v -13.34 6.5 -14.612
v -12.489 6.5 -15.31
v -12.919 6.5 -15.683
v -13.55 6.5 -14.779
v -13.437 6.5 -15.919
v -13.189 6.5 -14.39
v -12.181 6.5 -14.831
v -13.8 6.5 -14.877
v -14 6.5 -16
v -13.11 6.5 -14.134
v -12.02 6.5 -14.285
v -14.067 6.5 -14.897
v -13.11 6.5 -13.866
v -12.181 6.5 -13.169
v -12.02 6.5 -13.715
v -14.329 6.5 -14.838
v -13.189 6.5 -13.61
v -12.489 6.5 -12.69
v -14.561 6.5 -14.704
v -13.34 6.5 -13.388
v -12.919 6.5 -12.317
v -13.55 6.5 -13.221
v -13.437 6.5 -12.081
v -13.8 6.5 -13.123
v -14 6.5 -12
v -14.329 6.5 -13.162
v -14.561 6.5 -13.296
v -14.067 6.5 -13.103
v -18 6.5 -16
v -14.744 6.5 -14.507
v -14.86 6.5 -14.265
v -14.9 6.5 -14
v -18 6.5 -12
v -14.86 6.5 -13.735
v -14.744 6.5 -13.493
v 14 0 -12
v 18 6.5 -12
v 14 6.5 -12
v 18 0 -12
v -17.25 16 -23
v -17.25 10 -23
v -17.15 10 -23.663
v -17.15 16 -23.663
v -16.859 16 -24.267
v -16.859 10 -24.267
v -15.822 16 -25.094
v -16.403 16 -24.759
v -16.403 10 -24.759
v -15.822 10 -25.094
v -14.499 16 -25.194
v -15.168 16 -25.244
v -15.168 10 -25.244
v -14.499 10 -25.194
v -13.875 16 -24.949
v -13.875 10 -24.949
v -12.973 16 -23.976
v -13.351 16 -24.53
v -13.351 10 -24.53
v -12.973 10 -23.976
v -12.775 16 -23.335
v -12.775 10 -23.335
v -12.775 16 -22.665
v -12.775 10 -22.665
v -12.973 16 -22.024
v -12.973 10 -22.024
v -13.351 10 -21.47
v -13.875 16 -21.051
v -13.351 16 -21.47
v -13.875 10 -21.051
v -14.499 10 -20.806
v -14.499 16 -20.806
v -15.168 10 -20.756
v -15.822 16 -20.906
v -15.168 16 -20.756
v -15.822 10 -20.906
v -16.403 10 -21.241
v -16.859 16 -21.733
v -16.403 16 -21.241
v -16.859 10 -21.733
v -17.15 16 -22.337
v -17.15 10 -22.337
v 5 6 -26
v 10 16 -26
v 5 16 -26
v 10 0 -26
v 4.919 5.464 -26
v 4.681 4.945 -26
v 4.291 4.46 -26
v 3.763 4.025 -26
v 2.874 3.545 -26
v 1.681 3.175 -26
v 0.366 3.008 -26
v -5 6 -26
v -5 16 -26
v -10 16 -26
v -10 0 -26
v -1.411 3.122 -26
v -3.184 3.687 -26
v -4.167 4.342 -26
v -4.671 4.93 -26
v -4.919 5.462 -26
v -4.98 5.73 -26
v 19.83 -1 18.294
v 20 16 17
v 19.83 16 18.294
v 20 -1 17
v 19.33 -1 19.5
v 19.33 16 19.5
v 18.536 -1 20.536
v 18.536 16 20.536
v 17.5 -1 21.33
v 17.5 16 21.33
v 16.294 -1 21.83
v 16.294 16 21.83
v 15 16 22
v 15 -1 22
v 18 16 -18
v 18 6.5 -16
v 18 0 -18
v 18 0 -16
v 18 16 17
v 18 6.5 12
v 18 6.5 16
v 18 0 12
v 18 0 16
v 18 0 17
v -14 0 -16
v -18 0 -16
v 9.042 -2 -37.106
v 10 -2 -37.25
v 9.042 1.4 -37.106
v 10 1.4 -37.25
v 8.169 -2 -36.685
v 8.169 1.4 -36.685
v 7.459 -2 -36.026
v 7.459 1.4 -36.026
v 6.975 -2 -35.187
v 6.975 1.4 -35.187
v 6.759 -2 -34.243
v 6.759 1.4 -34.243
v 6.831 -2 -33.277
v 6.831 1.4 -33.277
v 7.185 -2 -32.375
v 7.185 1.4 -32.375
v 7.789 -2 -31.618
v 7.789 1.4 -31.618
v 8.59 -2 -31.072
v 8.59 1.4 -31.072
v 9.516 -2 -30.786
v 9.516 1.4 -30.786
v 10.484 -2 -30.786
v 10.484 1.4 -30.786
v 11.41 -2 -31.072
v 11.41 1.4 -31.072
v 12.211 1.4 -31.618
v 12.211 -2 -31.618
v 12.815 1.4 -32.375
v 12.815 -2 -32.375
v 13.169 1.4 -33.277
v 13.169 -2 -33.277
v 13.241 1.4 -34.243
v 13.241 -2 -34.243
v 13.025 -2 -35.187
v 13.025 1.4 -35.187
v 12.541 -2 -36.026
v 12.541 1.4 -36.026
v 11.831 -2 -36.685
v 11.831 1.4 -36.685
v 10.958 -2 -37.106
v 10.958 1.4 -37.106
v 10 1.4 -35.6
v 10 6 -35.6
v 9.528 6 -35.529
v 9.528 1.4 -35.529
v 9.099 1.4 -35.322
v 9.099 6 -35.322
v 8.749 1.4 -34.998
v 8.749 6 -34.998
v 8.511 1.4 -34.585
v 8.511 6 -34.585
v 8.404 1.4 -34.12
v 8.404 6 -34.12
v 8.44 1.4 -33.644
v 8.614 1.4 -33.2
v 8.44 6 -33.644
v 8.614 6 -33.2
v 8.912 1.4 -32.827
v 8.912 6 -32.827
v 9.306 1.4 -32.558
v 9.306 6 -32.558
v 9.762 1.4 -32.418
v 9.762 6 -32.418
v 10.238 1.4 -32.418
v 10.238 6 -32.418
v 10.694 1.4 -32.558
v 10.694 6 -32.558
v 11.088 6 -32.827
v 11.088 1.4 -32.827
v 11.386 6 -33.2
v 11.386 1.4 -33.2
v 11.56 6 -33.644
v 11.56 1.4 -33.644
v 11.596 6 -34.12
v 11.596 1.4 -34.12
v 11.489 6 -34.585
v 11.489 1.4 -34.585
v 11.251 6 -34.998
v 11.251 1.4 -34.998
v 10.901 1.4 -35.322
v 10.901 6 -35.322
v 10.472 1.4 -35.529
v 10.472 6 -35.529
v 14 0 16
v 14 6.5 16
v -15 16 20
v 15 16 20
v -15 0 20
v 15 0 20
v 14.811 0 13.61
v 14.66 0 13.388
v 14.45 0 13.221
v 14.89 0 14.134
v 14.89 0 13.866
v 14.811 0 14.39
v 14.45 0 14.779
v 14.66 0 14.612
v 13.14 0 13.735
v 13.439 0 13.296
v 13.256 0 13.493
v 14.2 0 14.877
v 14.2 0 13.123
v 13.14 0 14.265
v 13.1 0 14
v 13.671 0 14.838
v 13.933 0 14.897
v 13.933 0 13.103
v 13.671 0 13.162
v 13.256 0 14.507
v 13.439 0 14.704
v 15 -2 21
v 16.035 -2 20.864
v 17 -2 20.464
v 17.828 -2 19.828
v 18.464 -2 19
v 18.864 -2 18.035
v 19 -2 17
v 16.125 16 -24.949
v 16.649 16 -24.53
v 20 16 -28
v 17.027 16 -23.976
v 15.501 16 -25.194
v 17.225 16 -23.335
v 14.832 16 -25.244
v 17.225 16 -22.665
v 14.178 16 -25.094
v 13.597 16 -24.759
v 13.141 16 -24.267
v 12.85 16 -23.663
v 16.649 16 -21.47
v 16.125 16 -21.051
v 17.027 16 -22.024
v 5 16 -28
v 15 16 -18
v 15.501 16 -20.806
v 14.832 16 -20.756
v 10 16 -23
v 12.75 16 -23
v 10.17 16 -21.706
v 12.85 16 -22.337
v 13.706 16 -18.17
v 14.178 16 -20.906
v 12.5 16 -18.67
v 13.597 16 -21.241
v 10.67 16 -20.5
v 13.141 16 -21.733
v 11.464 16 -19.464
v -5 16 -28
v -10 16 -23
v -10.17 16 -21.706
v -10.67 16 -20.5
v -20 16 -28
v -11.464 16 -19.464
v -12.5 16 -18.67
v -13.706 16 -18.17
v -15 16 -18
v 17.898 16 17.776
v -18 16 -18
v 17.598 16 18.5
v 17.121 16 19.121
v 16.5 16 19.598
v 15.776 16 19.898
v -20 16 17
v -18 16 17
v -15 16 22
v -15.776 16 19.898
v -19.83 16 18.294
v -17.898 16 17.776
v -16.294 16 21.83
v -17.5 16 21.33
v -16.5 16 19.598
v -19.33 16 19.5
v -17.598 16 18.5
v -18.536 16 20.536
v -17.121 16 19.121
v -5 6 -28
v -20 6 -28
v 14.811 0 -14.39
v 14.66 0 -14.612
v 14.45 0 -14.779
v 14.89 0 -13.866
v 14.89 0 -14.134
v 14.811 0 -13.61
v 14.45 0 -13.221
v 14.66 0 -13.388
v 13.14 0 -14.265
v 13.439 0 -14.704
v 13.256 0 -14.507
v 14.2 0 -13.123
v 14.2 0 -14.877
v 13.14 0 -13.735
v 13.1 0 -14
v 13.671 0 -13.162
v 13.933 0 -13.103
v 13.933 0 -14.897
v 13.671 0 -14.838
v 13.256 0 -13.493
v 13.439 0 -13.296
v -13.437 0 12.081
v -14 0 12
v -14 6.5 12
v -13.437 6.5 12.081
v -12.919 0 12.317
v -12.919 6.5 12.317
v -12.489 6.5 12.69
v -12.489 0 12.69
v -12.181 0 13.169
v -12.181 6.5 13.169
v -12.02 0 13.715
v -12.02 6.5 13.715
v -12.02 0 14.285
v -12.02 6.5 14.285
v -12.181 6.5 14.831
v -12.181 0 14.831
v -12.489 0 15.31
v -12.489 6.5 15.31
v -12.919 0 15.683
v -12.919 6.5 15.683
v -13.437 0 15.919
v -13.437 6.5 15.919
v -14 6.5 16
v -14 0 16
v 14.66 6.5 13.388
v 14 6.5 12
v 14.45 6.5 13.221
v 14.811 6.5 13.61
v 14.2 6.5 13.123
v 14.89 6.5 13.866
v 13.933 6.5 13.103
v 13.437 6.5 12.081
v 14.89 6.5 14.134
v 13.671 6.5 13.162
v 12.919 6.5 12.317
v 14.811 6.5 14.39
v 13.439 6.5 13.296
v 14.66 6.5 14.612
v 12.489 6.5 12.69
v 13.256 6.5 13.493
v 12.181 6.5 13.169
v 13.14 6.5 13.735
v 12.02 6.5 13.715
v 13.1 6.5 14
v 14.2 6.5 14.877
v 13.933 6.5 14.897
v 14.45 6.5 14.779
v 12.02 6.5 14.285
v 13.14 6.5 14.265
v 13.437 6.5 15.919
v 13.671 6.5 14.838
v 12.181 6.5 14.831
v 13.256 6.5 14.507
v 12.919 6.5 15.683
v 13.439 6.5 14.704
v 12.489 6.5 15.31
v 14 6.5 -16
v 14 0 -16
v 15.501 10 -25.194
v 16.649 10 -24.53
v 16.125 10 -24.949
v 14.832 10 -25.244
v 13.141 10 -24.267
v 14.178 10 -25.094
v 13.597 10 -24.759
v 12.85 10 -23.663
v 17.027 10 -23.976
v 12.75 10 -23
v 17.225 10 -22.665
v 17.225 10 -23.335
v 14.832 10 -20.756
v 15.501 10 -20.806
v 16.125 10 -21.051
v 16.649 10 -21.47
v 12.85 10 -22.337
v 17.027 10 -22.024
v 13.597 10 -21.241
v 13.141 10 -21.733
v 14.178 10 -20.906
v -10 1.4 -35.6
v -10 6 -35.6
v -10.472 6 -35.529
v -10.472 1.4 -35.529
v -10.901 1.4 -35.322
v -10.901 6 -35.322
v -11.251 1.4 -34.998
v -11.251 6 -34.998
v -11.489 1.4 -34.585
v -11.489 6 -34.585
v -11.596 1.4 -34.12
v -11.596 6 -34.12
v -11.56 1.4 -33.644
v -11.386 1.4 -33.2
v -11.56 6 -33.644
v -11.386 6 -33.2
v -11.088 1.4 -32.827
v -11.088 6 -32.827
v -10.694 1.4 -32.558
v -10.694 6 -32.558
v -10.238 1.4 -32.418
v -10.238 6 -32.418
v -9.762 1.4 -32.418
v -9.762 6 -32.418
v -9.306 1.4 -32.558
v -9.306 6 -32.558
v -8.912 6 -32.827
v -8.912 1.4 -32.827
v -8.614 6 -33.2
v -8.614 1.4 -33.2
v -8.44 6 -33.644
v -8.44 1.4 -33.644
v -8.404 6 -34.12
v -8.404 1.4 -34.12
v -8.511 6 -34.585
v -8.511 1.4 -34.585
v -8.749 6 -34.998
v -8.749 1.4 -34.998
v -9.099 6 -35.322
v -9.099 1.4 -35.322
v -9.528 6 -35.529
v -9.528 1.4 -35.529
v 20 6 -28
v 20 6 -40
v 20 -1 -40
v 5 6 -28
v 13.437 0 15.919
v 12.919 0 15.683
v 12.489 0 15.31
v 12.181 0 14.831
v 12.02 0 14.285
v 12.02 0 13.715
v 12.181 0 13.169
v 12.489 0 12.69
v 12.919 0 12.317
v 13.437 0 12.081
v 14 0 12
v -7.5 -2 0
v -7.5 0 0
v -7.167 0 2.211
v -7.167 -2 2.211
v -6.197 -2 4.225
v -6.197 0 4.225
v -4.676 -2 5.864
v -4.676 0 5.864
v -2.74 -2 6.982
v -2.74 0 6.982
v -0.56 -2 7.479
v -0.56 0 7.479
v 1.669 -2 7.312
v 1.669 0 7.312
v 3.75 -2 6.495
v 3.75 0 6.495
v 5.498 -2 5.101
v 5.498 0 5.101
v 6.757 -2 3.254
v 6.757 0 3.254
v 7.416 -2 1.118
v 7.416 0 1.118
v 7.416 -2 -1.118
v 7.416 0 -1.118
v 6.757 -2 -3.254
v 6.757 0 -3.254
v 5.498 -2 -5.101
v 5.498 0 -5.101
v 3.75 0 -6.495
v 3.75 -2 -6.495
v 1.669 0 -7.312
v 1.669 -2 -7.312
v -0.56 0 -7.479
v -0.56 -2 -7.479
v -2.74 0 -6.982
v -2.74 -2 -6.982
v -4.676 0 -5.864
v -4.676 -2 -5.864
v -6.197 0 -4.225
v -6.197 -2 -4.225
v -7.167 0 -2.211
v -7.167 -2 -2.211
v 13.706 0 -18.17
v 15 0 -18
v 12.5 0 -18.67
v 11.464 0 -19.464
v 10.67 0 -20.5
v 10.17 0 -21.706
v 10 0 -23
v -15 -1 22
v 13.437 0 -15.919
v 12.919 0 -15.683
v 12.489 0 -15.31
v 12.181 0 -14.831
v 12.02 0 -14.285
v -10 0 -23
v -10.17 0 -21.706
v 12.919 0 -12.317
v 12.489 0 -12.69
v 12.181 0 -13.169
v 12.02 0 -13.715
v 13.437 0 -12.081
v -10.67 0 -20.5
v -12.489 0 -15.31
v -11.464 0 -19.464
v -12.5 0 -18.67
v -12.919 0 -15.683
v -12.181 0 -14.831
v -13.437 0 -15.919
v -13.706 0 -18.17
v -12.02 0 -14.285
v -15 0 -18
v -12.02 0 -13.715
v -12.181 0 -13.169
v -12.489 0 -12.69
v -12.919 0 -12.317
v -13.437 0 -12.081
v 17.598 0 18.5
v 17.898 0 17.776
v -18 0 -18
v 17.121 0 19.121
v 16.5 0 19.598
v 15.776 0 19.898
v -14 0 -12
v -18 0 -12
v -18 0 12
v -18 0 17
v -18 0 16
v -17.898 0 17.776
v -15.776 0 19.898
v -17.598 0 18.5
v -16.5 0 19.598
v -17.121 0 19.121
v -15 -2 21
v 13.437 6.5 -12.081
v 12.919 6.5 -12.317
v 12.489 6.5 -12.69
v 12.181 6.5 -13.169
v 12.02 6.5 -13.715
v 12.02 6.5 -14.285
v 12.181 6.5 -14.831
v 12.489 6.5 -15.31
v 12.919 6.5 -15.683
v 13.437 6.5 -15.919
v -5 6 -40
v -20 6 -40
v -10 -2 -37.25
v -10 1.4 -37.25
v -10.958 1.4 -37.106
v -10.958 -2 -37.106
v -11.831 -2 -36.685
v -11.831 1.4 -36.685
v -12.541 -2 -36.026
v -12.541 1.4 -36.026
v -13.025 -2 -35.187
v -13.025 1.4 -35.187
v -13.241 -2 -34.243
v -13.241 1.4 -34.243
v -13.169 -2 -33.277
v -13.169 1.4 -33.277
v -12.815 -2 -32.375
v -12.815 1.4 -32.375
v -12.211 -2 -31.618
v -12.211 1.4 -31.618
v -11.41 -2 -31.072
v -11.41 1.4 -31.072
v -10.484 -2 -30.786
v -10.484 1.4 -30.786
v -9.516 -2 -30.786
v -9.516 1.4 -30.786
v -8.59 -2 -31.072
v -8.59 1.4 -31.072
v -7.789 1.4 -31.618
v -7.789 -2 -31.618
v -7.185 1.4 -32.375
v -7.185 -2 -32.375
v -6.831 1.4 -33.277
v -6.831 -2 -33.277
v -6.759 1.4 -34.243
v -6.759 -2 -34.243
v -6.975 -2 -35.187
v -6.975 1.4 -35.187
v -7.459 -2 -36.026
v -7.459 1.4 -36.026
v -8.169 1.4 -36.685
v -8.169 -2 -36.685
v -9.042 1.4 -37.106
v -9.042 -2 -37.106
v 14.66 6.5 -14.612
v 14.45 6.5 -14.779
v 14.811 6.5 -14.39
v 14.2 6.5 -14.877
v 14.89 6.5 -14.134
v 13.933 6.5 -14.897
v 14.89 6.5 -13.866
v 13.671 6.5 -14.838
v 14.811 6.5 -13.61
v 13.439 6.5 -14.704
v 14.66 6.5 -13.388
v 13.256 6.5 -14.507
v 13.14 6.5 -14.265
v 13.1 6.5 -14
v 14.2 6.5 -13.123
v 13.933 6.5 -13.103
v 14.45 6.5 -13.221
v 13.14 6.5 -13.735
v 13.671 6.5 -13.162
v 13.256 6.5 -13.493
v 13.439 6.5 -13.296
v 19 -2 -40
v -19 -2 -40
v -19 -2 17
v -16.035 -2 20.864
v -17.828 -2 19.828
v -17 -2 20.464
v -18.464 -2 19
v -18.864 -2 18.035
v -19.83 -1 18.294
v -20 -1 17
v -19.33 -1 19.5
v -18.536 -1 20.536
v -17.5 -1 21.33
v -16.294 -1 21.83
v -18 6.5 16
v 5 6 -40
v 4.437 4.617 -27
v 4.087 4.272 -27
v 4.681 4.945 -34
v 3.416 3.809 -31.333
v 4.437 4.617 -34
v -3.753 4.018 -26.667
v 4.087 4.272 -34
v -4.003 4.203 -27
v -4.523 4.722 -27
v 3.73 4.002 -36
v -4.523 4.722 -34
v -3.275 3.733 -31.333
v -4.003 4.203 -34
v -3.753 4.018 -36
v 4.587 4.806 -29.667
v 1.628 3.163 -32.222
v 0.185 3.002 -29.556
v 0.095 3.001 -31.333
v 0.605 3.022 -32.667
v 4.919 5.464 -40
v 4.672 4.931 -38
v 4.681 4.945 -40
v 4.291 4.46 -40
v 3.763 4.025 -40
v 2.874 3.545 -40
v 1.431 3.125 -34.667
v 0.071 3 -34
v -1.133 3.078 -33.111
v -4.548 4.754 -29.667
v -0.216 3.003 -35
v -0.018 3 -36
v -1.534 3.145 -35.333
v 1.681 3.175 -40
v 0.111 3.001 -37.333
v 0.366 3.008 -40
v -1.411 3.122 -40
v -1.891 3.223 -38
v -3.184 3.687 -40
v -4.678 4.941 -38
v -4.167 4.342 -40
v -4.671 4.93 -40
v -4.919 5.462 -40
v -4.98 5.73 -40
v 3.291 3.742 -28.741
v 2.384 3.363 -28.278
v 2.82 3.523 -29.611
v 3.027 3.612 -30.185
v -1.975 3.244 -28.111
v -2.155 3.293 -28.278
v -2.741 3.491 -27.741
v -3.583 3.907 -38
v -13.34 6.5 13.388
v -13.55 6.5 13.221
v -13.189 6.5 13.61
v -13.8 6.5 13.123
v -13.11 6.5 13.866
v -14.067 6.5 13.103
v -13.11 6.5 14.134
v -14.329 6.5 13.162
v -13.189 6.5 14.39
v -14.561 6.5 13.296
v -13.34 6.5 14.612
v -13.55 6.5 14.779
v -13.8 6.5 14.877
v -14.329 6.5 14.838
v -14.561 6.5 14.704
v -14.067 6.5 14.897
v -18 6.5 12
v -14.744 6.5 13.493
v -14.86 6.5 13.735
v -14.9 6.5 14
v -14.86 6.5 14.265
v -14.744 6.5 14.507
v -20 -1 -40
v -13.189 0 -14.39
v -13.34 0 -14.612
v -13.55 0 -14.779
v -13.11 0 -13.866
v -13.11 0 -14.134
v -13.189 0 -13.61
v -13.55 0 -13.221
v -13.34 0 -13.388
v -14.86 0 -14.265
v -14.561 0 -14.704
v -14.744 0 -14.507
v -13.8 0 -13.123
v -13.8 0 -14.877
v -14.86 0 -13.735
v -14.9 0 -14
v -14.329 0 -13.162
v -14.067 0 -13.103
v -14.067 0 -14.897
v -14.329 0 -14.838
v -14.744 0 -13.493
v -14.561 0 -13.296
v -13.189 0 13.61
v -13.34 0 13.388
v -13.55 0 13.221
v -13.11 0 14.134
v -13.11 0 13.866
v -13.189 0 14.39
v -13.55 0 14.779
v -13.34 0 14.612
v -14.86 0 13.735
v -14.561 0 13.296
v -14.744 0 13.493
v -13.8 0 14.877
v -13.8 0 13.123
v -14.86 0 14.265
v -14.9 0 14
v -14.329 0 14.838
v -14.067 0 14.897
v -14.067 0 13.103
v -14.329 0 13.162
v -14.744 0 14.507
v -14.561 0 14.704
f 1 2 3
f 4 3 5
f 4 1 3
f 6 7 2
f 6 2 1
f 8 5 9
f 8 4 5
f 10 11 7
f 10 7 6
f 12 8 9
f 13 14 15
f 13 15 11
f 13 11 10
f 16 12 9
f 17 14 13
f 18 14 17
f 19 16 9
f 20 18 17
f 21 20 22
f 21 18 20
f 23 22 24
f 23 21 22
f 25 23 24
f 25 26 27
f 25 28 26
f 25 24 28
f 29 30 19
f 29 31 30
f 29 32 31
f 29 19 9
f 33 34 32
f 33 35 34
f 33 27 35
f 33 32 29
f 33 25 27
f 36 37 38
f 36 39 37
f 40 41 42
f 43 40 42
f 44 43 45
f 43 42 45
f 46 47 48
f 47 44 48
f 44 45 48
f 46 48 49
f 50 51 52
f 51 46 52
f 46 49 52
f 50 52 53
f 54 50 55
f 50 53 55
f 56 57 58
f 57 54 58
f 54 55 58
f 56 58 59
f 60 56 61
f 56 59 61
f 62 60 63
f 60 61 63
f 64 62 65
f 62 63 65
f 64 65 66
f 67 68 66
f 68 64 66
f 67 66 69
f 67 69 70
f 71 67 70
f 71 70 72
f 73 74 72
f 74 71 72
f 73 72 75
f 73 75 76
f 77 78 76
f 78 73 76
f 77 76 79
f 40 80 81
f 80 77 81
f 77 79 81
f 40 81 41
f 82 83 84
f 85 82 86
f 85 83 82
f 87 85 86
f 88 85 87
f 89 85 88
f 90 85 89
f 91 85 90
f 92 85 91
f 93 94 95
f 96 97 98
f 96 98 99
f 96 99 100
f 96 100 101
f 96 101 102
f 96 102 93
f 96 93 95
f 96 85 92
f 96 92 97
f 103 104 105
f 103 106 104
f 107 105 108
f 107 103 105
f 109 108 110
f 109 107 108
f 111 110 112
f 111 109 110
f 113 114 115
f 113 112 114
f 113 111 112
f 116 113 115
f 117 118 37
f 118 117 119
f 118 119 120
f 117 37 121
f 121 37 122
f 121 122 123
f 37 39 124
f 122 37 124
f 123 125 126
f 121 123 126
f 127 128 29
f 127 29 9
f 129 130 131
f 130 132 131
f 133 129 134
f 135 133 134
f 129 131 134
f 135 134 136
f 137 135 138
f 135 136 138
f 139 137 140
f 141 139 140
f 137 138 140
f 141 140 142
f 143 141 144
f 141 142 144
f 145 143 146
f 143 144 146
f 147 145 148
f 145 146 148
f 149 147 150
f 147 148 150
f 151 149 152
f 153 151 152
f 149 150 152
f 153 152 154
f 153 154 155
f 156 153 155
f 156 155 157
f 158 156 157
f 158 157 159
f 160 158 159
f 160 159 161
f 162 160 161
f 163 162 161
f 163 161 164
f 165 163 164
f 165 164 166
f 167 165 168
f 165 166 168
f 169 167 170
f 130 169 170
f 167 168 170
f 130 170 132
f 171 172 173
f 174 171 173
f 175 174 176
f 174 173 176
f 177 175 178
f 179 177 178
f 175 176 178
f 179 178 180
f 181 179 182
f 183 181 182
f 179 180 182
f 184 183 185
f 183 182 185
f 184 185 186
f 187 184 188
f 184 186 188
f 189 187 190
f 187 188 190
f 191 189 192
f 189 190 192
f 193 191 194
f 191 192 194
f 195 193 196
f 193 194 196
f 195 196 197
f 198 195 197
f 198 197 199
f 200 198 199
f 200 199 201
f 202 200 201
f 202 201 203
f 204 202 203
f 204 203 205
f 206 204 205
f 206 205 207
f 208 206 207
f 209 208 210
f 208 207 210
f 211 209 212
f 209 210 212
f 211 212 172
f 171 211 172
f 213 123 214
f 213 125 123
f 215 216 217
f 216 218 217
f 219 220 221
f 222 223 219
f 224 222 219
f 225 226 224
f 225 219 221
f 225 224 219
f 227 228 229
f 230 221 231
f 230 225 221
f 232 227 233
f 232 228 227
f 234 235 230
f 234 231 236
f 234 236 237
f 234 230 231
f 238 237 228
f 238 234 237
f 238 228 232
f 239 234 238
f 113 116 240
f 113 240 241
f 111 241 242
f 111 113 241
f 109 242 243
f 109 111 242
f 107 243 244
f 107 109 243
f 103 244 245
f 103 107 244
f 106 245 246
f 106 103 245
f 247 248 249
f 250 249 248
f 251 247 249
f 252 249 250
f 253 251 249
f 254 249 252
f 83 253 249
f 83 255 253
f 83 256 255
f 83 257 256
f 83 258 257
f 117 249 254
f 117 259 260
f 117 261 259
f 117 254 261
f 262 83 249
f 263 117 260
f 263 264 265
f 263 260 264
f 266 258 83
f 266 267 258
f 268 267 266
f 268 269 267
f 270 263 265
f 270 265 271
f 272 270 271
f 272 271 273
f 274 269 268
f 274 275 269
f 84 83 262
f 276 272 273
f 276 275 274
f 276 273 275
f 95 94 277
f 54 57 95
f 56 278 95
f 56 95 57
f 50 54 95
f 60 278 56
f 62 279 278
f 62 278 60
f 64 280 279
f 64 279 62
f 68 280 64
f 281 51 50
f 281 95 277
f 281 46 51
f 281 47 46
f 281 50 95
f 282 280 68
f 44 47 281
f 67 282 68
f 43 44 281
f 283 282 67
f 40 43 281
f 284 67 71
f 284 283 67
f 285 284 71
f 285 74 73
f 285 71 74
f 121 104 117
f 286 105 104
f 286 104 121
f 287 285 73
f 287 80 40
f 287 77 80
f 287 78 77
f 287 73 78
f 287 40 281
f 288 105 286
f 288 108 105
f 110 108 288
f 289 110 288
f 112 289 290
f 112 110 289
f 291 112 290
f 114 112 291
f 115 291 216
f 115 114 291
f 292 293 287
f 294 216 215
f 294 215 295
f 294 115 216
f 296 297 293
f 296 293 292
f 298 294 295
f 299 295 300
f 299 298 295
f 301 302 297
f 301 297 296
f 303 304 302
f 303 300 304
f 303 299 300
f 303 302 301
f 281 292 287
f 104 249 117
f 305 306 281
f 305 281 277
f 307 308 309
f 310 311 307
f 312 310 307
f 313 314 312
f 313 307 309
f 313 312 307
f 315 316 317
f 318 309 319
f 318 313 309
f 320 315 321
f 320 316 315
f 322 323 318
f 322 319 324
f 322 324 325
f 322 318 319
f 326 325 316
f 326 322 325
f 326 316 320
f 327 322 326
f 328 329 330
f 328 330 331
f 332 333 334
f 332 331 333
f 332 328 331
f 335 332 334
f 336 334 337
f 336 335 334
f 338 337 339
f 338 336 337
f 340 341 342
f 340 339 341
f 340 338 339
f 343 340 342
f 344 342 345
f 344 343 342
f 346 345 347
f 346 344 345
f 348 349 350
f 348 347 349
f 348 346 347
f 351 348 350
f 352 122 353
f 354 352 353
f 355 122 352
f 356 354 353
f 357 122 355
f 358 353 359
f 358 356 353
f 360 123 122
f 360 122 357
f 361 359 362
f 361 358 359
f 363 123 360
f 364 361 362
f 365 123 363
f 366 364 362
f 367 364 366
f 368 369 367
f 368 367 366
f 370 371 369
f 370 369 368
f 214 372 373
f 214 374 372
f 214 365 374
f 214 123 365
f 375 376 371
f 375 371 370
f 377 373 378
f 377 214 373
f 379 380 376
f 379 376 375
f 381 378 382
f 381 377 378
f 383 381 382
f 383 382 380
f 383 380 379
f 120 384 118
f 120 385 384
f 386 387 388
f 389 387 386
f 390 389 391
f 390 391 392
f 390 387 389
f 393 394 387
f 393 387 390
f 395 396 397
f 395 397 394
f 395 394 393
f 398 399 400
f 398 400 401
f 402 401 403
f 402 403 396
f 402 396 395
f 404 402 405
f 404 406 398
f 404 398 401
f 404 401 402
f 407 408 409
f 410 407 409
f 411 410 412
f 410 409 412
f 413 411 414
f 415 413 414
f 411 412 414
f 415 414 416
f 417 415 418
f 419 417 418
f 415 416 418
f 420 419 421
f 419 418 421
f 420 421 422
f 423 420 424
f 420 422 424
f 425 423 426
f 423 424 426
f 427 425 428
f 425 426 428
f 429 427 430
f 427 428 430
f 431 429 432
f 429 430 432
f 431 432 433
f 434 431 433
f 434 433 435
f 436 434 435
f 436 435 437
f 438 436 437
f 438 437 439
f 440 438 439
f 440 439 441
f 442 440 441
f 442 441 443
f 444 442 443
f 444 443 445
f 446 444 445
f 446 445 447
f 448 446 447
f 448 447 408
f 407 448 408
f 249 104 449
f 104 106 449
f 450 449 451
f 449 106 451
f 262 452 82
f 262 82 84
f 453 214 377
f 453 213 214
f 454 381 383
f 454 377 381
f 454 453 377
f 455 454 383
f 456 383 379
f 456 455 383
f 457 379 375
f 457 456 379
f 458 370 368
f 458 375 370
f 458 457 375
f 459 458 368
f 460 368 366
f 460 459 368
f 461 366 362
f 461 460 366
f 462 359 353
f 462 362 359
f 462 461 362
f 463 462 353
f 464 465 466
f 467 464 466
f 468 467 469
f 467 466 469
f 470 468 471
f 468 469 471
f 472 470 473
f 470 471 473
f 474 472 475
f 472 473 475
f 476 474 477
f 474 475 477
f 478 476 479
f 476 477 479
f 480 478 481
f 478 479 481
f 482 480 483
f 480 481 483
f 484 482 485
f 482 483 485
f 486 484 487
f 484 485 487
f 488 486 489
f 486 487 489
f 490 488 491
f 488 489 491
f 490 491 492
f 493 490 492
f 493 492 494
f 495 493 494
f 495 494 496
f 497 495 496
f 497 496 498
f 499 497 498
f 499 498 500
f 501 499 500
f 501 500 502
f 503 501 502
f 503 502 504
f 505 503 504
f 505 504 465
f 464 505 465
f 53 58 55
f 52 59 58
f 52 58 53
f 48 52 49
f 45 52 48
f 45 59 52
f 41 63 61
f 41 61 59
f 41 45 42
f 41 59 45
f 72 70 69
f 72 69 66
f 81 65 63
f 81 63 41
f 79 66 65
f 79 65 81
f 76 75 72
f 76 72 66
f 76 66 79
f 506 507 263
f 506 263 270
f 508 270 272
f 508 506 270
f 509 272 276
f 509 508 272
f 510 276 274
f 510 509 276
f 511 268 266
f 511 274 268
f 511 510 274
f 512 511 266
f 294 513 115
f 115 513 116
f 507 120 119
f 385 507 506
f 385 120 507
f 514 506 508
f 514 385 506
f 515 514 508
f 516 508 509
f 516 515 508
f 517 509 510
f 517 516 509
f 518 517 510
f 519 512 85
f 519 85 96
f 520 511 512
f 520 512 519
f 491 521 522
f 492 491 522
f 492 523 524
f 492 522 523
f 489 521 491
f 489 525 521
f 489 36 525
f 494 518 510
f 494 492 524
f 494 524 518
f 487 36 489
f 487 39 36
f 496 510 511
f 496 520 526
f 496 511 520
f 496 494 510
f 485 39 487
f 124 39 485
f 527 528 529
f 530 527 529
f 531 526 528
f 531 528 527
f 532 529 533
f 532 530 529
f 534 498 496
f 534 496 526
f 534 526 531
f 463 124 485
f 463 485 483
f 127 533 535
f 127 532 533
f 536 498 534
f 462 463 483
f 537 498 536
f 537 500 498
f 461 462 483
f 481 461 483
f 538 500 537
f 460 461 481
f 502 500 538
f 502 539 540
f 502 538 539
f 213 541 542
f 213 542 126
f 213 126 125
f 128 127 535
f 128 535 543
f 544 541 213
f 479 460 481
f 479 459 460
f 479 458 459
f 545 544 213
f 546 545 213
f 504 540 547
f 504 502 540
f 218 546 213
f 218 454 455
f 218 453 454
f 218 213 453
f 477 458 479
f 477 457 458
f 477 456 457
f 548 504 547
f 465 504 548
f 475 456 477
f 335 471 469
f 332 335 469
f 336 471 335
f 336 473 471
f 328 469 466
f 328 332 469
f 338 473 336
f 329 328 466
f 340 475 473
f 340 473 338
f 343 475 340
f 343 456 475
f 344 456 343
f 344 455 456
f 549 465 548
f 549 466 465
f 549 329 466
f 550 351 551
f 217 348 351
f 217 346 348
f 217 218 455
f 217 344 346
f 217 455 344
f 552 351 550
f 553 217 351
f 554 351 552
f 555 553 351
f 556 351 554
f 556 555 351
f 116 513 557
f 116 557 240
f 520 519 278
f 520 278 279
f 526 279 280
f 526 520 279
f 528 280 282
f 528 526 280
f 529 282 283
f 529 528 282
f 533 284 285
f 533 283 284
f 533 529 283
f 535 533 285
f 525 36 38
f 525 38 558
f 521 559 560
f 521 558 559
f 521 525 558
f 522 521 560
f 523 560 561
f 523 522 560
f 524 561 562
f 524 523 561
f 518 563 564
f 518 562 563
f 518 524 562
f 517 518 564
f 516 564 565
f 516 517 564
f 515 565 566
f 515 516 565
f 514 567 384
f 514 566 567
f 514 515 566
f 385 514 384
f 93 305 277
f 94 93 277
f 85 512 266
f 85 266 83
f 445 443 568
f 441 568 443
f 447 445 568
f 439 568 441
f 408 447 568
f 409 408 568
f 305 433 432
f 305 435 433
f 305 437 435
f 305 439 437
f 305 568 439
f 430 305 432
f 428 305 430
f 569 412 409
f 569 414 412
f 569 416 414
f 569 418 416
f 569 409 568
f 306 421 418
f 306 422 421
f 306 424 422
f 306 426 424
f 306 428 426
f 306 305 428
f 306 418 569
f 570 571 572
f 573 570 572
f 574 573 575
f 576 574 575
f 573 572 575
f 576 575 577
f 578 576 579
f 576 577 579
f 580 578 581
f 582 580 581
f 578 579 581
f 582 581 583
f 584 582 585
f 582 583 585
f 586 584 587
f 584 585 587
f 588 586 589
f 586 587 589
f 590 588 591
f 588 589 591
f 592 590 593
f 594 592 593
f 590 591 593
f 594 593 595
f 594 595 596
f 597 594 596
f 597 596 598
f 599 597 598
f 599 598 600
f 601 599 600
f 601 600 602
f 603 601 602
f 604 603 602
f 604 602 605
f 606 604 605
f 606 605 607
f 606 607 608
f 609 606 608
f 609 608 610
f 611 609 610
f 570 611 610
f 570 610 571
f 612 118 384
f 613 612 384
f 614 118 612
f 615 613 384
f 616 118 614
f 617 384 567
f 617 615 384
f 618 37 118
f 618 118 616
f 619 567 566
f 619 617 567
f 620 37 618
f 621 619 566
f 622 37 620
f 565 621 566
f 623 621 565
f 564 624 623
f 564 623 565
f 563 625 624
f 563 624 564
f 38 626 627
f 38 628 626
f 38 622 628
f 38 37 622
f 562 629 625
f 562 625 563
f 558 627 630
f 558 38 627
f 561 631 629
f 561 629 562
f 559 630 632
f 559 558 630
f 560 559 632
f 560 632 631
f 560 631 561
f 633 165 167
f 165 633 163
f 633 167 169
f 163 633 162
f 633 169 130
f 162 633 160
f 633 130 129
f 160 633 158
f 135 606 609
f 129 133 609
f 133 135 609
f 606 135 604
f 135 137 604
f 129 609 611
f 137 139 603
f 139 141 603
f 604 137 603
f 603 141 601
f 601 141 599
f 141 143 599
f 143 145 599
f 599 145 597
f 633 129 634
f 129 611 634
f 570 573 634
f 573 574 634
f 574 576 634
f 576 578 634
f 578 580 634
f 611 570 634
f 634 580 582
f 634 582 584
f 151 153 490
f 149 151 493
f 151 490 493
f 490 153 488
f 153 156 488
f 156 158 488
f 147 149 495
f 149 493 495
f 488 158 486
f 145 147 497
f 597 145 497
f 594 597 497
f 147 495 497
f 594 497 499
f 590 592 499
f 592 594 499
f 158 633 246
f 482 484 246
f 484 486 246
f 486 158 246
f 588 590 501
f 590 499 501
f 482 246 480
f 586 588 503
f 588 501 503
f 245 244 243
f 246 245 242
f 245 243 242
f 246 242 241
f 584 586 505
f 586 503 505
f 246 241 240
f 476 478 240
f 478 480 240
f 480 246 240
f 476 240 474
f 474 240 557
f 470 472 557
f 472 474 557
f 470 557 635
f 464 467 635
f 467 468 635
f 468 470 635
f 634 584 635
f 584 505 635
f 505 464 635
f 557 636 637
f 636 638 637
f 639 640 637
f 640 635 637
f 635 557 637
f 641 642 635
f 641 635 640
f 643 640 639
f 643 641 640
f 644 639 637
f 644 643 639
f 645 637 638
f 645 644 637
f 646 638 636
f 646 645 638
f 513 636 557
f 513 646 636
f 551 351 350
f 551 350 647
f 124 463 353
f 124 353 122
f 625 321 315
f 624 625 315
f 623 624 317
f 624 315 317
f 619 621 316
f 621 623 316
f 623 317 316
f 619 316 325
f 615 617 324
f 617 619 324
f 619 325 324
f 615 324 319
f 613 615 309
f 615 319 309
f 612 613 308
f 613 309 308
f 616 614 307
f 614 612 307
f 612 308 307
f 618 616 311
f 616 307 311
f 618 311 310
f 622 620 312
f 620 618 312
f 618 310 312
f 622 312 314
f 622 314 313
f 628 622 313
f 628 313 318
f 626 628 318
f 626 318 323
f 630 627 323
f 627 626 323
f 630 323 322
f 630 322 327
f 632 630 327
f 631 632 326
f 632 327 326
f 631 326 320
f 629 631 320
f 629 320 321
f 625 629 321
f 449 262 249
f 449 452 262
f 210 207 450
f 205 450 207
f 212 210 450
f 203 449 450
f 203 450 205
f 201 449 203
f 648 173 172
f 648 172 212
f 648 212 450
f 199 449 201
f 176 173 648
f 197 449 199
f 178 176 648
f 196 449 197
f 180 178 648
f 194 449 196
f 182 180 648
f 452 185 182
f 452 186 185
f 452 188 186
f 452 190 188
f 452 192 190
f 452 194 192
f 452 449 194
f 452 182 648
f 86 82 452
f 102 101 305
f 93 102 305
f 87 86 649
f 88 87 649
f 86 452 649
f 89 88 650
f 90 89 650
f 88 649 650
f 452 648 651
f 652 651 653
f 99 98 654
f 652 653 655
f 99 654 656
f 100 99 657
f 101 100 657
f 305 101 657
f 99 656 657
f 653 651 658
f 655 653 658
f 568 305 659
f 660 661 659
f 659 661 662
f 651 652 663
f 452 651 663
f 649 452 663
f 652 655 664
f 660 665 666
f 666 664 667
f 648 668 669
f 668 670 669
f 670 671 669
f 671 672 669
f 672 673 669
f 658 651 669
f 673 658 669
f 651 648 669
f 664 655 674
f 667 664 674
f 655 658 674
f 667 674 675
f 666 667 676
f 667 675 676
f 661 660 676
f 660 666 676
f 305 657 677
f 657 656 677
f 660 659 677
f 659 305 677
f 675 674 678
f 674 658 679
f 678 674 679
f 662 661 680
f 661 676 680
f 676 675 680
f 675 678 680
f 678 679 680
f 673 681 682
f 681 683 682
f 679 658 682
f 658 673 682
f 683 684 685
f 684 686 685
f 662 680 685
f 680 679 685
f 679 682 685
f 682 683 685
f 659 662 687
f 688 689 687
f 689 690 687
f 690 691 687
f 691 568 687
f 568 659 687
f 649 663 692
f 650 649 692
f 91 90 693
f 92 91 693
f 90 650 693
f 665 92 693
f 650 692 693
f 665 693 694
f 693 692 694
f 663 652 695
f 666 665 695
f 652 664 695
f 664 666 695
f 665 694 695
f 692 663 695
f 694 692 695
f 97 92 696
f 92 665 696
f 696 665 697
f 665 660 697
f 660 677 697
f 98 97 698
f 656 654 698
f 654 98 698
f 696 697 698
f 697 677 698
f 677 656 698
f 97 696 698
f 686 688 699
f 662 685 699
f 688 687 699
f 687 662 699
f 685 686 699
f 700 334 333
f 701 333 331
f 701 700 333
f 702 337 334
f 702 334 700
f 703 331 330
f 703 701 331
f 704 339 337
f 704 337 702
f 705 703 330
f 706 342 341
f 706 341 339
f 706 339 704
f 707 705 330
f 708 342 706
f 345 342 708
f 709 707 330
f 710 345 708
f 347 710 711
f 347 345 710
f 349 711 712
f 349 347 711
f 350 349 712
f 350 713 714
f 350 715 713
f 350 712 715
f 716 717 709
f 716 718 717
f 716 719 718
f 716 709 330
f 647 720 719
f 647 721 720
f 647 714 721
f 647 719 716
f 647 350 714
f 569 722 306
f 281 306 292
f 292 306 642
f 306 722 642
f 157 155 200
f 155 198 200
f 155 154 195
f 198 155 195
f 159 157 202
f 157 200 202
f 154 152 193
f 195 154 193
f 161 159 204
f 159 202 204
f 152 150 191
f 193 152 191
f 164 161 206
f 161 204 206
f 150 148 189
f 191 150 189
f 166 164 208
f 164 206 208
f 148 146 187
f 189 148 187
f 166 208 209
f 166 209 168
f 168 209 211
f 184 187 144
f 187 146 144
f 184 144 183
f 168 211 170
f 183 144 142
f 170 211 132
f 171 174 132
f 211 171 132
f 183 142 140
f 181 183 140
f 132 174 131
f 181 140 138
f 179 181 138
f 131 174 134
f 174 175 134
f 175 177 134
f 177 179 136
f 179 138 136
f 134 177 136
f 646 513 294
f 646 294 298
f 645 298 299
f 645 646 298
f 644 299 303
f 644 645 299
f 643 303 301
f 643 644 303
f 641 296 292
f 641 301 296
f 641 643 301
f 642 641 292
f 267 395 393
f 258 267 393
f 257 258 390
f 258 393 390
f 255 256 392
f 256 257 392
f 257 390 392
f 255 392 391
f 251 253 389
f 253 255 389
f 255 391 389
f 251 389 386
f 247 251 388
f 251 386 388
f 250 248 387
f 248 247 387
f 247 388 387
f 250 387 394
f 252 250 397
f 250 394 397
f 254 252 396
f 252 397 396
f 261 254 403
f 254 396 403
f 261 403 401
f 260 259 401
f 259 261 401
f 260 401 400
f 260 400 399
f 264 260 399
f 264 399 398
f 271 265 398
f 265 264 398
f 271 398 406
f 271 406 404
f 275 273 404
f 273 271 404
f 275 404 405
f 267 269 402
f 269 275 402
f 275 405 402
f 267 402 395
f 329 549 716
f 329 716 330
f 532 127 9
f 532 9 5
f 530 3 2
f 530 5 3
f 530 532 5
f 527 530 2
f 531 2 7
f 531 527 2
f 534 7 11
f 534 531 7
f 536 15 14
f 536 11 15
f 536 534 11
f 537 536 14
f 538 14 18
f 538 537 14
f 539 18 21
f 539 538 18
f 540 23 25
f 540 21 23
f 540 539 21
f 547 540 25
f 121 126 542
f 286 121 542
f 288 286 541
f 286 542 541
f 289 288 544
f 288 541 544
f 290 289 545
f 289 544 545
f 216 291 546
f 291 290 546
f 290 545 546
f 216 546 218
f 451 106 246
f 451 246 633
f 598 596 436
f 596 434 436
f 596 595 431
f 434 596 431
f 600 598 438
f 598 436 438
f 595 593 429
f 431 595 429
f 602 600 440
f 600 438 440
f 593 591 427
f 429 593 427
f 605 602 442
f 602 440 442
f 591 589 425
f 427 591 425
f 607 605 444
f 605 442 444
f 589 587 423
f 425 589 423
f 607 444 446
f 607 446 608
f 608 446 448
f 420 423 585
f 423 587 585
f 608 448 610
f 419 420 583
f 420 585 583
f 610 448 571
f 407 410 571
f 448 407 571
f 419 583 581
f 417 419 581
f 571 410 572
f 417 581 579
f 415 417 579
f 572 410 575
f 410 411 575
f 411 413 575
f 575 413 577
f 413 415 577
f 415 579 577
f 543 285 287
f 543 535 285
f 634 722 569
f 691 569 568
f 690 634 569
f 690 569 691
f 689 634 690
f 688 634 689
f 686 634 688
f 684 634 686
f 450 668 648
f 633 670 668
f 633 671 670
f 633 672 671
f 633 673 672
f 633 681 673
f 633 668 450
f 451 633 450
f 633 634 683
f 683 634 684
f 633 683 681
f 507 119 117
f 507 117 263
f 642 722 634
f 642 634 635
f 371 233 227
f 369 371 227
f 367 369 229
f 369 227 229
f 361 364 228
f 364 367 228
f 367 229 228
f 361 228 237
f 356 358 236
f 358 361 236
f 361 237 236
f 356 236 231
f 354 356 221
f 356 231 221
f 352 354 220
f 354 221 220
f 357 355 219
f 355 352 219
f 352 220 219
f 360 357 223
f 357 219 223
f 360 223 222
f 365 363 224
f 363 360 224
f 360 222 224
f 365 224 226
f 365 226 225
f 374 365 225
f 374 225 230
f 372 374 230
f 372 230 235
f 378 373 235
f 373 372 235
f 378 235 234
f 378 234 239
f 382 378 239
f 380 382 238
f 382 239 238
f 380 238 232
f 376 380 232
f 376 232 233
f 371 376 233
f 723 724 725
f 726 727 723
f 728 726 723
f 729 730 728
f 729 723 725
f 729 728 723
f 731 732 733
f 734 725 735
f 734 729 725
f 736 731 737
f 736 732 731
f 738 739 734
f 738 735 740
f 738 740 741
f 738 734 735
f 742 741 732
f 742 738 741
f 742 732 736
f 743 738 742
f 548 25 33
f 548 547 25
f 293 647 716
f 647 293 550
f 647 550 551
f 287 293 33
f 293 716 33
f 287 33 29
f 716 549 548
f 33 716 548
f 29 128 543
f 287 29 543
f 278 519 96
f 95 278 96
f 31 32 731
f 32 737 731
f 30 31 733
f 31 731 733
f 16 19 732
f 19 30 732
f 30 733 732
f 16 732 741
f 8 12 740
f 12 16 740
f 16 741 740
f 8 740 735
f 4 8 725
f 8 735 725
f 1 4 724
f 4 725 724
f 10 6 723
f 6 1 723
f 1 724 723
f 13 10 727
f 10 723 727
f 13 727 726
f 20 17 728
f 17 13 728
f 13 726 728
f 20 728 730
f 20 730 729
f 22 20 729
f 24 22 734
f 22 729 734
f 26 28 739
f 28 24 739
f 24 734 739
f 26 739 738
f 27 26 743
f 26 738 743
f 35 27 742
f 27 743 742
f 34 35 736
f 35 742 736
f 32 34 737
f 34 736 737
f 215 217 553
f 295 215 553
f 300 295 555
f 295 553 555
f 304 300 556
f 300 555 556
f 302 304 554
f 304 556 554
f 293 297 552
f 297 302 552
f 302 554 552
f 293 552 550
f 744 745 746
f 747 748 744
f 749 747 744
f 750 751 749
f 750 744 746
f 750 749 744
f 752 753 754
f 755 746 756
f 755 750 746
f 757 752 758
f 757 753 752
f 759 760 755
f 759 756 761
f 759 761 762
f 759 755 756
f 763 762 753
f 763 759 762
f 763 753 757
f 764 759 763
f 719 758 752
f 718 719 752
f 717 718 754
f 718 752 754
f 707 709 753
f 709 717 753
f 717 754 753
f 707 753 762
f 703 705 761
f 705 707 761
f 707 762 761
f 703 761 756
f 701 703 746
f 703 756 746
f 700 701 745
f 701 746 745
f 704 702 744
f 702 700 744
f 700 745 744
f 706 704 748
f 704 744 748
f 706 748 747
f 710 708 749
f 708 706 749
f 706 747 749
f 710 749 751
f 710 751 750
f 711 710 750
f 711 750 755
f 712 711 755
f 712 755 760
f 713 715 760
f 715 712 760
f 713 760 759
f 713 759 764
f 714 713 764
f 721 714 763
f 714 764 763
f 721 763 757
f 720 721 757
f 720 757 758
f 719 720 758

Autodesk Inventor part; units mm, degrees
ref_plane "YZ Plane" through (0, 0, 0) normal (1, 0, 0) x (0, 1, 0)
ref_plane "XZ Plane" through (0, 0, 0) normal (0, 1, 0) x (-1, 0, 0)
ref_plane "XY Plane" through (0, 0, 0) normal (0, 0, 1) x (1, 0, 0)
sketch "Skizze1" plane through (0, 0, 0) normal (0, 1, 0) x (-1, 0, 0)
  arc A0 (20, 17) -> (15, 22) centre (15, 17) ccw
  arc A1 (-15, 22) -> (-20, 17) centre (-15, 17) ccw
  line L0 (14, -12) -> (18, -12)
  arc A2 (14, -12) -> (14, -16) centre (14, -14) ccw
  line L1 (18, -16) -> (14, -16)
  line L2 (-14, -16) -> (-18, -16)
  arc A3 (-14, -16) -> (-14, -12) centre (-14, -14) ccw
  line L3 (-18, -12) -> (-14, -12)
  line L4 (-14, 12) -> (-18, 12)
  arc A4 (-14, 12) -> (-14, 16) centre (-14, 14) ccw
  line L5 (-18, 16) -> (-14, 16)
  line L6 (14, 16) -> (18, 16)
  arc A5 (14, 16) -> (14, 12) centre (14, 14) ccw
  line L7 (18, 12) -> (14, 12)
  line L8 (14, 14) -> (-14, 14) construction
  line L9 (-14, 14) -> (-14, -14) construction
  line L10 (-14, -14) -> (14, -14) construction
  line L11 (14, -14) -> (14, 14) construction
  line L12 (14, 14) -> (-14, -14) construction
  line L13 (-14, 14) -> (14, -14) construction
  circle A6 centre (0, 0) radius 7.5
  line L14 (20, -40) -> (-20, -40) construction
  line L15 (-20, -40) -> (-20, 22) construction
  line L16 (-20, 22) -> (20, 22) construction
  line L17 (20, 22) -> (20, -40) construction
  line L18 (20, -40) -> (-20, -40)
  line L19 (15, 22) -> (-15, 22)
  line L20 (20, -40) -> (20, 17)
  line L21 (-20, 17) -> (-20, -40)
  line L22 (0, -40) -> (0, 22) construction
  arc A7 (18, 17) -> (15, 20) centre (15, 17) ccw
  arc A8 (-15, 20) -> (-18, 17) centre (-15, 17) ccw
  line L23 (-15, 20) -> (15, 20)
  circle A9 centre (14, 14) radius 0.9
  circle A10 centre (-14, 14) radius 0.9
  circle A11 centre (-14, -14) radius 0.9
  circle A12 centre (14, -14) radius 0.9
  line L24 (20, -28) -> (-20, -28)
  circle A13 centre (-15, -23) radius 5 construction
  circle A14 centre (15, -23) radius 5 construction
  line L25 (-18, -18) -> (-15, -18)
  line L26 (-10, -23) -> (-10, -26)
  line L27 (15, -18) -> (18, -18)
  line L28 (10, -23) -> (10, -26)
  arc A15 (-10, -23) -> (-15, -18) centre (-15, -23) ccw
  arc A16 (15, -18) -> (10, -23) centre (15, -23) ccw
  circle A17 centre (-15, -23) radius 2.25
  circle A18 centre (15, -23) radius 2.25
  line L29 (-18, -18) -> (-18, 17)
  line L30 (18, 17) -> (18, -18)
  line L31 (-10, -26) -> (10, -26)
  point P0 (0, 0)
  point P1 (0, 20)
  point P2 (0, -26)
  point P3 (-15, -18)
  point P4 (-12, -14)
  point P5 (-12, -19)
  point P6 (12, -14)
  point P7 (12, -19)
  dimension "d2" = 15
  dimension "d3" = 40
  dimension "d5" = 22
  dimension "d7" = 5
  dimension "d10" = 2
  dimension "d14" = 1.8
  dimension "d41" = 12
  dimension "d42" = 2
  dimension "d43" = 2
  dimension "d45" = 4.5
  dimension "d49" = 10
  dimension "d50" = 28
  dimension "d51" = 2
  dimension "d52" = 28
extrude "Extrusion1" add sketch "Skizze1" against normal blind 2 contours L20 L24 L21 A1 L19 A0 | L20 L18 L21 L24 | A2 L1 L30 L27 A16 L28 L31 L26 A15 L25 L29 L2 A3 L3 L4 A4 L5 A8 L23 A7 L6 A5 L7 L0 | L0 L30 L1 A2 | L7 A5 L6 L30 | L5 A4 L4 L29 | L3 A3 L2 L29 | A9 | A10 | A11 | A12 | A17 | A18
extrude "Extrusion2" add sketch "Skizze1" along normal blind 16 contours L20 L24 L21 A1 L19 A0
extrude "Extrusion3" add sketch "Skizze1" along normal blind 6 contours L20 L18 L21 L24
extrude "Extrusion4" add sketch "Skizze1" along normal blind 6.5 contours L0 L30 L1 A2 | L7 A5 L6 L30 | L5 A4 L4 L29 | L3 A3 L2 L29
sketch "Skizze2" plane through (0, -2, 0) normal (0, -1, 0) x (1, 0, 0)
  arc A0 (-15, 22) -> (-20, 17) centre (-15, 17) ccw projected
  line L0 (-20, 17) -> (-20, -40) projected
  line L1 (-20, -40) -> (20, -40) projected
  line L2 (20, -40) -> (20, 17) projected
  arc A1 (20, 17) -> (15, 22) centre (15, 17) ccw projected
  line L3 (15, 22) -> (-15, 22) projected
  circle A2 centre (0, 0) radius 7.5 projected
  line L4 (15, 22) -> (-15, 22) projected
  line L5 (0, 22) -> (0, -40) construction
  point P0 (10, -34)
  point P1 (-10, -34)
  dimension "d25" = 20
  dimension "d26" = 6
hole "Bohrung1" at (10, -2, -34) at (-10, -2, -34) direction (0, 1, 0) diameter 3.2 end through all counterbore diameter 6.5 counterbore depth 3.4 clearance for "Inbusschraube DIN EN ISO 4762" size "M3" standard "DIN"
sketch "Skizze3" plane through (20, -2, -40) normal (0, 0, -1) x (-1, 0, 0)
  line L0 (0, 8) -> (40, 8) projected
  line L1 (40, 8) -> (40, 18) projected
  line L2 (0, 18) -> (40, 18) projected
  line L3 (0, 8) -> (0, 18) projected
  line L4 (0, 0) -> (0, 8) projected
  line L5 (40, 0) -> (0, 0) projected
  line L6 (40, 0) -> (40, 8) projected
  line L7 (0, 8) -> (40, 8) projected
  line L8 (0, 8) -> (40, 8) projected
  ellipse E0 centre (20, 8) end of major axis (25, 8) minor radius 3
  line L9 (0, 8) -> (40, 8) projected
  line L10 (15, 8) -> (15, 18)
  line L11 (5, 18) -> (35, 18) projected
  line L12 (15, 18) -> (25, 18)
  line L13 (25, 8) -> (25, 18)
  point P0 (20, 2)
  dimension "d37" = 3
  dimension "d38" = 5
extrude "Extrusion5" cut sketch "Skizze3" against normal up to surface (14 mm away) contours E0 L0 | L10 L2 L13 E0 | L0 E0
extrude "Extrusion6" add sketch "Skizze1" along normal blind 10 contours A17 | A18
chamfer "Fase1" distance 1 angle 45 5 edges at (20, -2, -11.5) (18.5355, -2, 20.5355) (0, -2, 22) (-18.5355, -2, 20.5355) (-20, -2, -11.5)
equation "\"d42\" = d51"
equation "\"d43\" = d51"
properties part number "LED-Ring_Camera-Housing"
